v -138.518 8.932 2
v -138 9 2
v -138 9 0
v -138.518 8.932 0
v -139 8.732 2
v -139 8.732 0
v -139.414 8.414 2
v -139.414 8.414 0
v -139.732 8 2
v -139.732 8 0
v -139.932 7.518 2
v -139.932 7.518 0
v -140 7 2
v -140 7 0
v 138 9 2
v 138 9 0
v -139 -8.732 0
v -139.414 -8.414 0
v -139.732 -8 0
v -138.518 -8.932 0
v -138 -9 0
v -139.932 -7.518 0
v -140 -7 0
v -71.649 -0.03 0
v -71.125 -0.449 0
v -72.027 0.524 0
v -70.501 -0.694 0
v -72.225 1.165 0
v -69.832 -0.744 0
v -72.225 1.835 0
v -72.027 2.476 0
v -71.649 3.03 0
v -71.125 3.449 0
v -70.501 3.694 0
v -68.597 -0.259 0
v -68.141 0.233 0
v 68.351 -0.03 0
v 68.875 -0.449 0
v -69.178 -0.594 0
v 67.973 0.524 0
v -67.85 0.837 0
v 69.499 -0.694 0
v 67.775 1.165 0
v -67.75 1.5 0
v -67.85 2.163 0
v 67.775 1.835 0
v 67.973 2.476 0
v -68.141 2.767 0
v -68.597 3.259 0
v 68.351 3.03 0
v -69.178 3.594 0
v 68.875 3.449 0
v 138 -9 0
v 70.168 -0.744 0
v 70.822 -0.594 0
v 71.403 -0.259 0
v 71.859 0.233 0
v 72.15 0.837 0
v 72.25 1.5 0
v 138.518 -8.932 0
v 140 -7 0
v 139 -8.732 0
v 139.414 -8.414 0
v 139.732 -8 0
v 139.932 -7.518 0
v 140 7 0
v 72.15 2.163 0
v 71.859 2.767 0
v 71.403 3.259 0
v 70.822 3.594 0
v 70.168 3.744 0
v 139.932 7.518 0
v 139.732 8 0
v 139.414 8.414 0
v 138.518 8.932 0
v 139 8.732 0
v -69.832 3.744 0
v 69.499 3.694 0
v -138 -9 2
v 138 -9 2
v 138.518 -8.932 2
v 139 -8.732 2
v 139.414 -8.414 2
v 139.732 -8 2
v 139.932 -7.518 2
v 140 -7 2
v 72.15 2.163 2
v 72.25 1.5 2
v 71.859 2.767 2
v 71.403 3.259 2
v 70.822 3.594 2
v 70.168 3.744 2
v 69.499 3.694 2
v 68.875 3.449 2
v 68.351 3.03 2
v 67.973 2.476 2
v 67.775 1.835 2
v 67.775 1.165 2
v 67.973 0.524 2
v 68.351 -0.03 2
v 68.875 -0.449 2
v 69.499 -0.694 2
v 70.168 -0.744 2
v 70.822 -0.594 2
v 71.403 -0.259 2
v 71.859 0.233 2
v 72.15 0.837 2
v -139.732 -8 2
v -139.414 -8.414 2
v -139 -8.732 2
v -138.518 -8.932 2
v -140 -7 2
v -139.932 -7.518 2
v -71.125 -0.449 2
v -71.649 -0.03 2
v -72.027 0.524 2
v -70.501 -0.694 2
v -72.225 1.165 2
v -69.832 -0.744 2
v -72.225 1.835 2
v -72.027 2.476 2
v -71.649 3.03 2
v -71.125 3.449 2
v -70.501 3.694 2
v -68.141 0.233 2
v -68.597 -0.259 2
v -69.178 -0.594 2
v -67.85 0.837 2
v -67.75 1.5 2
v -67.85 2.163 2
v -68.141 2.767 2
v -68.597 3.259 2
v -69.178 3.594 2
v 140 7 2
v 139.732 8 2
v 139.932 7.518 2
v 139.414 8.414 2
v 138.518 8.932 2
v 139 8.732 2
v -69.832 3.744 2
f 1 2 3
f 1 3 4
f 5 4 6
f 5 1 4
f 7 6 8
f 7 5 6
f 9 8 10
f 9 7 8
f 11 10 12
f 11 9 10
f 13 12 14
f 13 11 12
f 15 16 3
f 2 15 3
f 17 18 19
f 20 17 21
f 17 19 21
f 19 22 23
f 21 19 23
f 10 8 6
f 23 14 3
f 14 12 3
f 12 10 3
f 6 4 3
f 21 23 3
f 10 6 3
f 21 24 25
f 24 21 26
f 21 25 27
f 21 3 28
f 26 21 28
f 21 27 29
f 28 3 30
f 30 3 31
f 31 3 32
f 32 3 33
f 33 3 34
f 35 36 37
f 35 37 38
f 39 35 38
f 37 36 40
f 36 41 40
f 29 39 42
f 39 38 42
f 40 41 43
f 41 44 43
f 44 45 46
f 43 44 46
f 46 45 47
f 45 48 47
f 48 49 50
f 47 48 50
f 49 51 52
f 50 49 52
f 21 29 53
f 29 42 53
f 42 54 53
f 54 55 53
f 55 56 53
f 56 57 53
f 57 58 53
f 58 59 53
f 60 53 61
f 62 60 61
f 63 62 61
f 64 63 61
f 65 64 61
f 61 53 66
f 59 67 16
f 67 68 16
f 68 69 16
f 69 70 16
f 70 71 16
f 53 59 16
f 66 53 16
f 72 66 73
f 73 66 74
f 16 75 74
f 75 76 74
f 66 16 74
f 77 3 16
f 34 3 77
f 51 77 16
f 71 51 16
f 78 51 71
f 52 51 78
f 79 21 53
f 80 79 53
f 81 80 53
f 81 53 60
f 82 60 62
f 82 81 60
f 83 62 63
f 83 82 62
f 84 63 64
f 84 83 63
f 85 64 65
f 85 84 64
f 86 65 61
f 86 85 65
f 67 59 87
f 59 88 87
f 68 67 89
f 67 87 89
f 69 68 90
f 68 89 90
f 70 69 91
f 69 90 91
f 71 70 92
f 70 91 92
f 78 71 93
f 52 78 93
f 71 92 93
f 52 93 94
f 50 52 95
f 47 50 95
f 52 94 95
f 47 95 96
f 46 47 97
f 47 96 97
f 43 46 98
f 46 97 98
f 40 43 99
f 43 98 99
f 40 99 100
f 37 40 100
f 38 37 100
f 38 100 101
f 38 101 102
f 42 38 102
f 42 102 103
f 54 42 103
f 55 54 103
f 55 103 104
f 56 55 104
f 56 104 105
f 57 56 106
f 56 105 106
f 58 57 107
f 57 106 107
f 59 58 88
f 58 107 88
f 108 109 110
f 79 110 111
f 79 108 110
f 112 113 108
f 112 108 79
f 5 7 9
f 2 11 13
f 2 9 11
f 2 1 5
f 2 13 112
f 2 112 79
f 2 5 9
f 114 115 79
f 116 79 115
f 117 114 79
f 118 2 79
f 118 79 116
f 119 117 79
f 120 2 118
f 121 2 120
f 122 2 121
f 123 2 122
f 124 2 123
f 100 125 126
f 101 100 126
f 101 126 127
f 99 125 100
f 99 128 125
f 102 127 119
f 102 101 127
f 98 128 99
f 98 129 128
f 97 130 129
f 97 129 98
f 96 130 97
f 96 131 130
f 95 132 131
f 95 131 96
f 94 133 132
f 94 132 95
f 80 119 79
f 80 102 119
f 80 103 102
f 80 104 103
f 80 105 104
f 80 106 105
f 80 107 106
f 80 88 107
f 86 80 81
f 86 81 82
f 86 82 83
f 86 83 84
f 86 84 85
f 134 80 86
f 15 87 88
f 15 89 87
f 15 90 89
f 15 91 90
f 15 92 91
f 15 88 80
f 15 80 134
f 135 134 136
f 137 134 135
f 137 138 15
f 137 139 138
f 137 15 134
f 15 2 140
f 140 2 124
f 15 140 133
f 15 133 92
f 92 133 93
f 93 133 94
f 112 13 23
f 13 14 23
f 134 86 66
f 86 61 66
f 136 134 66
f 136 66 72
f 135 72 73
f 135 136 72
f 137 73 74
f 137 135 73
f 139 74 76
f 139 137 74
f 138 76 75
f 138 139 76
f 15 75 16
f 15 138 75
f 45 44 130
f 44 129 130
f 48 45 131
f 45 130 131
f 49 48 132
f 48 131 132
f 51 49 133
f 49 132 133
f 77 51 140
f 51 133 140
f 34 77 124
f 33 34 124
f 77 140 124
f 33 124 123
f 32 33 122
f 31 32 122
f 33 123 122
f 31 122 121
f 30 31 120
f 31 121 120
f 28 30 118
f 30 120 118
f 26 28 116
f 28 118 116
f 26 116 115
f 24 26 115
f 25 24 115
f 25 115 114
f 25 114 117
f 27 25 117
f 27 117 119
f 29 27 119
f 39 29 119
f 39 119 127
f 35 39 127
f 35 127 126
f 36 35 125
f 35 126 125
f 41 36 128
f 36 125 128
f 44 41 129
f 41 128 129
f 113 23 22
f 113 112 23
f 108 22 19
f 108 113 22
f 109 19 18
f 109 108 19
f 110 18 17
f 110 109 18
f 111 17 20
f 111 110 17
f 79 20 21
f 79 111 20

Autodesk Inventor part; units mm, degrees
ref_plane "YZ Plane" through (0, 0, 0) normal (1, 0, 0) x (0, 1, 0)
ref_plane "XZ Plane" through (0, 0, 0) normal (0, 1, 0) x (-1, 0, 0)
ref_plane "XY Plane" through (0, 0, 0) normal (0, 0, 1) x (1, 0, 0)
sketch "Sketch1" plane through (0, 0, 0) normal (0, 0, 1) x (1, 0, 0)
  line L0 (-140, -9) -> (140, -9)
  line L1 (140, -9) -> (140, 9)
  line L2 (140, 9) -> (-140, 9)
  line L3 (-140, 9) -> (-140, -9)
  line L4 (-140, -9) -> (140, 9) construction
  line L5 (140, -9) -> (-140, 9) construction
  point P0 (0, 0)
  dimension "d0" = 280
  dimension "d1" = 18
extrude "Extrusion1" add sketch "Sketch1" along normal blind 2
sketch "Sketch3" plane through (0, 0, 2) normal (0, 0, 1) x (1, 0, 0)
  line L0 (-99.5384, 1.5) -> (103.3668, 1.5) construction
  circle A0 centre (-70, 1.5) radius 2.25
  circle A1 centre (70, 1.5) radius 2.25
  line L1 (140, 9) -> (-140, 9) projected
  line L2 (-108, -2.5) -> (123, -2.5) construction
  line L3 (-140, -9) -> (140, -9) projected
  point P0 (0, 0)
  dimension "d4" = 4.5
  dimension "d5" = 4.5
  dimension "d6" = 7.5
  dimension "d7" = 6.5
  dimension "d8" = 70
  dimension "d9" = 70
extrude "Extrusion2" cut sketch "Sketch3" against normal blind 2
fillet "Fillet1" radius 2 4 edges at (-140, 9, 1) (-140, -9, 1) (140, 9, 1) (140, -9, 1)
sketch "Sketch4" plane through (0, 0, 2) normal (0, 0, 1) x (1, 0, 0)
  arc A0 (138, -9) -> (140, -7) centre (138, -7) ccw projected
  line L0 (140, -7) -> (140, 7) projected
  arc A1 (140, 7) -> (138, 9) centre (138, 7) ccw projected
  line L1 (138, 9) -> (-138, 9) projected
  arc A2 (-138, 9) -> (-140, 7) centre (-138, 7) ccw projected
  line L2 (-140, 7) -> (-140, -7) projected
  arc A3 (-140, -7) -> (-138, -9) centre (-138, -7) ccw projected
  line L3 (-138, -9) -> (138, -9) projected
  circle A4 centre (70, 1.5) radius 2.25 projected
  circle A5 centre (-70, 1.5) radius 2.25 projected
  point P0 (0, 0)
equation "\"d5\" = d4"
equation "\"d9\" = d8"
properties part number "DisplayAcrylicHolder"
